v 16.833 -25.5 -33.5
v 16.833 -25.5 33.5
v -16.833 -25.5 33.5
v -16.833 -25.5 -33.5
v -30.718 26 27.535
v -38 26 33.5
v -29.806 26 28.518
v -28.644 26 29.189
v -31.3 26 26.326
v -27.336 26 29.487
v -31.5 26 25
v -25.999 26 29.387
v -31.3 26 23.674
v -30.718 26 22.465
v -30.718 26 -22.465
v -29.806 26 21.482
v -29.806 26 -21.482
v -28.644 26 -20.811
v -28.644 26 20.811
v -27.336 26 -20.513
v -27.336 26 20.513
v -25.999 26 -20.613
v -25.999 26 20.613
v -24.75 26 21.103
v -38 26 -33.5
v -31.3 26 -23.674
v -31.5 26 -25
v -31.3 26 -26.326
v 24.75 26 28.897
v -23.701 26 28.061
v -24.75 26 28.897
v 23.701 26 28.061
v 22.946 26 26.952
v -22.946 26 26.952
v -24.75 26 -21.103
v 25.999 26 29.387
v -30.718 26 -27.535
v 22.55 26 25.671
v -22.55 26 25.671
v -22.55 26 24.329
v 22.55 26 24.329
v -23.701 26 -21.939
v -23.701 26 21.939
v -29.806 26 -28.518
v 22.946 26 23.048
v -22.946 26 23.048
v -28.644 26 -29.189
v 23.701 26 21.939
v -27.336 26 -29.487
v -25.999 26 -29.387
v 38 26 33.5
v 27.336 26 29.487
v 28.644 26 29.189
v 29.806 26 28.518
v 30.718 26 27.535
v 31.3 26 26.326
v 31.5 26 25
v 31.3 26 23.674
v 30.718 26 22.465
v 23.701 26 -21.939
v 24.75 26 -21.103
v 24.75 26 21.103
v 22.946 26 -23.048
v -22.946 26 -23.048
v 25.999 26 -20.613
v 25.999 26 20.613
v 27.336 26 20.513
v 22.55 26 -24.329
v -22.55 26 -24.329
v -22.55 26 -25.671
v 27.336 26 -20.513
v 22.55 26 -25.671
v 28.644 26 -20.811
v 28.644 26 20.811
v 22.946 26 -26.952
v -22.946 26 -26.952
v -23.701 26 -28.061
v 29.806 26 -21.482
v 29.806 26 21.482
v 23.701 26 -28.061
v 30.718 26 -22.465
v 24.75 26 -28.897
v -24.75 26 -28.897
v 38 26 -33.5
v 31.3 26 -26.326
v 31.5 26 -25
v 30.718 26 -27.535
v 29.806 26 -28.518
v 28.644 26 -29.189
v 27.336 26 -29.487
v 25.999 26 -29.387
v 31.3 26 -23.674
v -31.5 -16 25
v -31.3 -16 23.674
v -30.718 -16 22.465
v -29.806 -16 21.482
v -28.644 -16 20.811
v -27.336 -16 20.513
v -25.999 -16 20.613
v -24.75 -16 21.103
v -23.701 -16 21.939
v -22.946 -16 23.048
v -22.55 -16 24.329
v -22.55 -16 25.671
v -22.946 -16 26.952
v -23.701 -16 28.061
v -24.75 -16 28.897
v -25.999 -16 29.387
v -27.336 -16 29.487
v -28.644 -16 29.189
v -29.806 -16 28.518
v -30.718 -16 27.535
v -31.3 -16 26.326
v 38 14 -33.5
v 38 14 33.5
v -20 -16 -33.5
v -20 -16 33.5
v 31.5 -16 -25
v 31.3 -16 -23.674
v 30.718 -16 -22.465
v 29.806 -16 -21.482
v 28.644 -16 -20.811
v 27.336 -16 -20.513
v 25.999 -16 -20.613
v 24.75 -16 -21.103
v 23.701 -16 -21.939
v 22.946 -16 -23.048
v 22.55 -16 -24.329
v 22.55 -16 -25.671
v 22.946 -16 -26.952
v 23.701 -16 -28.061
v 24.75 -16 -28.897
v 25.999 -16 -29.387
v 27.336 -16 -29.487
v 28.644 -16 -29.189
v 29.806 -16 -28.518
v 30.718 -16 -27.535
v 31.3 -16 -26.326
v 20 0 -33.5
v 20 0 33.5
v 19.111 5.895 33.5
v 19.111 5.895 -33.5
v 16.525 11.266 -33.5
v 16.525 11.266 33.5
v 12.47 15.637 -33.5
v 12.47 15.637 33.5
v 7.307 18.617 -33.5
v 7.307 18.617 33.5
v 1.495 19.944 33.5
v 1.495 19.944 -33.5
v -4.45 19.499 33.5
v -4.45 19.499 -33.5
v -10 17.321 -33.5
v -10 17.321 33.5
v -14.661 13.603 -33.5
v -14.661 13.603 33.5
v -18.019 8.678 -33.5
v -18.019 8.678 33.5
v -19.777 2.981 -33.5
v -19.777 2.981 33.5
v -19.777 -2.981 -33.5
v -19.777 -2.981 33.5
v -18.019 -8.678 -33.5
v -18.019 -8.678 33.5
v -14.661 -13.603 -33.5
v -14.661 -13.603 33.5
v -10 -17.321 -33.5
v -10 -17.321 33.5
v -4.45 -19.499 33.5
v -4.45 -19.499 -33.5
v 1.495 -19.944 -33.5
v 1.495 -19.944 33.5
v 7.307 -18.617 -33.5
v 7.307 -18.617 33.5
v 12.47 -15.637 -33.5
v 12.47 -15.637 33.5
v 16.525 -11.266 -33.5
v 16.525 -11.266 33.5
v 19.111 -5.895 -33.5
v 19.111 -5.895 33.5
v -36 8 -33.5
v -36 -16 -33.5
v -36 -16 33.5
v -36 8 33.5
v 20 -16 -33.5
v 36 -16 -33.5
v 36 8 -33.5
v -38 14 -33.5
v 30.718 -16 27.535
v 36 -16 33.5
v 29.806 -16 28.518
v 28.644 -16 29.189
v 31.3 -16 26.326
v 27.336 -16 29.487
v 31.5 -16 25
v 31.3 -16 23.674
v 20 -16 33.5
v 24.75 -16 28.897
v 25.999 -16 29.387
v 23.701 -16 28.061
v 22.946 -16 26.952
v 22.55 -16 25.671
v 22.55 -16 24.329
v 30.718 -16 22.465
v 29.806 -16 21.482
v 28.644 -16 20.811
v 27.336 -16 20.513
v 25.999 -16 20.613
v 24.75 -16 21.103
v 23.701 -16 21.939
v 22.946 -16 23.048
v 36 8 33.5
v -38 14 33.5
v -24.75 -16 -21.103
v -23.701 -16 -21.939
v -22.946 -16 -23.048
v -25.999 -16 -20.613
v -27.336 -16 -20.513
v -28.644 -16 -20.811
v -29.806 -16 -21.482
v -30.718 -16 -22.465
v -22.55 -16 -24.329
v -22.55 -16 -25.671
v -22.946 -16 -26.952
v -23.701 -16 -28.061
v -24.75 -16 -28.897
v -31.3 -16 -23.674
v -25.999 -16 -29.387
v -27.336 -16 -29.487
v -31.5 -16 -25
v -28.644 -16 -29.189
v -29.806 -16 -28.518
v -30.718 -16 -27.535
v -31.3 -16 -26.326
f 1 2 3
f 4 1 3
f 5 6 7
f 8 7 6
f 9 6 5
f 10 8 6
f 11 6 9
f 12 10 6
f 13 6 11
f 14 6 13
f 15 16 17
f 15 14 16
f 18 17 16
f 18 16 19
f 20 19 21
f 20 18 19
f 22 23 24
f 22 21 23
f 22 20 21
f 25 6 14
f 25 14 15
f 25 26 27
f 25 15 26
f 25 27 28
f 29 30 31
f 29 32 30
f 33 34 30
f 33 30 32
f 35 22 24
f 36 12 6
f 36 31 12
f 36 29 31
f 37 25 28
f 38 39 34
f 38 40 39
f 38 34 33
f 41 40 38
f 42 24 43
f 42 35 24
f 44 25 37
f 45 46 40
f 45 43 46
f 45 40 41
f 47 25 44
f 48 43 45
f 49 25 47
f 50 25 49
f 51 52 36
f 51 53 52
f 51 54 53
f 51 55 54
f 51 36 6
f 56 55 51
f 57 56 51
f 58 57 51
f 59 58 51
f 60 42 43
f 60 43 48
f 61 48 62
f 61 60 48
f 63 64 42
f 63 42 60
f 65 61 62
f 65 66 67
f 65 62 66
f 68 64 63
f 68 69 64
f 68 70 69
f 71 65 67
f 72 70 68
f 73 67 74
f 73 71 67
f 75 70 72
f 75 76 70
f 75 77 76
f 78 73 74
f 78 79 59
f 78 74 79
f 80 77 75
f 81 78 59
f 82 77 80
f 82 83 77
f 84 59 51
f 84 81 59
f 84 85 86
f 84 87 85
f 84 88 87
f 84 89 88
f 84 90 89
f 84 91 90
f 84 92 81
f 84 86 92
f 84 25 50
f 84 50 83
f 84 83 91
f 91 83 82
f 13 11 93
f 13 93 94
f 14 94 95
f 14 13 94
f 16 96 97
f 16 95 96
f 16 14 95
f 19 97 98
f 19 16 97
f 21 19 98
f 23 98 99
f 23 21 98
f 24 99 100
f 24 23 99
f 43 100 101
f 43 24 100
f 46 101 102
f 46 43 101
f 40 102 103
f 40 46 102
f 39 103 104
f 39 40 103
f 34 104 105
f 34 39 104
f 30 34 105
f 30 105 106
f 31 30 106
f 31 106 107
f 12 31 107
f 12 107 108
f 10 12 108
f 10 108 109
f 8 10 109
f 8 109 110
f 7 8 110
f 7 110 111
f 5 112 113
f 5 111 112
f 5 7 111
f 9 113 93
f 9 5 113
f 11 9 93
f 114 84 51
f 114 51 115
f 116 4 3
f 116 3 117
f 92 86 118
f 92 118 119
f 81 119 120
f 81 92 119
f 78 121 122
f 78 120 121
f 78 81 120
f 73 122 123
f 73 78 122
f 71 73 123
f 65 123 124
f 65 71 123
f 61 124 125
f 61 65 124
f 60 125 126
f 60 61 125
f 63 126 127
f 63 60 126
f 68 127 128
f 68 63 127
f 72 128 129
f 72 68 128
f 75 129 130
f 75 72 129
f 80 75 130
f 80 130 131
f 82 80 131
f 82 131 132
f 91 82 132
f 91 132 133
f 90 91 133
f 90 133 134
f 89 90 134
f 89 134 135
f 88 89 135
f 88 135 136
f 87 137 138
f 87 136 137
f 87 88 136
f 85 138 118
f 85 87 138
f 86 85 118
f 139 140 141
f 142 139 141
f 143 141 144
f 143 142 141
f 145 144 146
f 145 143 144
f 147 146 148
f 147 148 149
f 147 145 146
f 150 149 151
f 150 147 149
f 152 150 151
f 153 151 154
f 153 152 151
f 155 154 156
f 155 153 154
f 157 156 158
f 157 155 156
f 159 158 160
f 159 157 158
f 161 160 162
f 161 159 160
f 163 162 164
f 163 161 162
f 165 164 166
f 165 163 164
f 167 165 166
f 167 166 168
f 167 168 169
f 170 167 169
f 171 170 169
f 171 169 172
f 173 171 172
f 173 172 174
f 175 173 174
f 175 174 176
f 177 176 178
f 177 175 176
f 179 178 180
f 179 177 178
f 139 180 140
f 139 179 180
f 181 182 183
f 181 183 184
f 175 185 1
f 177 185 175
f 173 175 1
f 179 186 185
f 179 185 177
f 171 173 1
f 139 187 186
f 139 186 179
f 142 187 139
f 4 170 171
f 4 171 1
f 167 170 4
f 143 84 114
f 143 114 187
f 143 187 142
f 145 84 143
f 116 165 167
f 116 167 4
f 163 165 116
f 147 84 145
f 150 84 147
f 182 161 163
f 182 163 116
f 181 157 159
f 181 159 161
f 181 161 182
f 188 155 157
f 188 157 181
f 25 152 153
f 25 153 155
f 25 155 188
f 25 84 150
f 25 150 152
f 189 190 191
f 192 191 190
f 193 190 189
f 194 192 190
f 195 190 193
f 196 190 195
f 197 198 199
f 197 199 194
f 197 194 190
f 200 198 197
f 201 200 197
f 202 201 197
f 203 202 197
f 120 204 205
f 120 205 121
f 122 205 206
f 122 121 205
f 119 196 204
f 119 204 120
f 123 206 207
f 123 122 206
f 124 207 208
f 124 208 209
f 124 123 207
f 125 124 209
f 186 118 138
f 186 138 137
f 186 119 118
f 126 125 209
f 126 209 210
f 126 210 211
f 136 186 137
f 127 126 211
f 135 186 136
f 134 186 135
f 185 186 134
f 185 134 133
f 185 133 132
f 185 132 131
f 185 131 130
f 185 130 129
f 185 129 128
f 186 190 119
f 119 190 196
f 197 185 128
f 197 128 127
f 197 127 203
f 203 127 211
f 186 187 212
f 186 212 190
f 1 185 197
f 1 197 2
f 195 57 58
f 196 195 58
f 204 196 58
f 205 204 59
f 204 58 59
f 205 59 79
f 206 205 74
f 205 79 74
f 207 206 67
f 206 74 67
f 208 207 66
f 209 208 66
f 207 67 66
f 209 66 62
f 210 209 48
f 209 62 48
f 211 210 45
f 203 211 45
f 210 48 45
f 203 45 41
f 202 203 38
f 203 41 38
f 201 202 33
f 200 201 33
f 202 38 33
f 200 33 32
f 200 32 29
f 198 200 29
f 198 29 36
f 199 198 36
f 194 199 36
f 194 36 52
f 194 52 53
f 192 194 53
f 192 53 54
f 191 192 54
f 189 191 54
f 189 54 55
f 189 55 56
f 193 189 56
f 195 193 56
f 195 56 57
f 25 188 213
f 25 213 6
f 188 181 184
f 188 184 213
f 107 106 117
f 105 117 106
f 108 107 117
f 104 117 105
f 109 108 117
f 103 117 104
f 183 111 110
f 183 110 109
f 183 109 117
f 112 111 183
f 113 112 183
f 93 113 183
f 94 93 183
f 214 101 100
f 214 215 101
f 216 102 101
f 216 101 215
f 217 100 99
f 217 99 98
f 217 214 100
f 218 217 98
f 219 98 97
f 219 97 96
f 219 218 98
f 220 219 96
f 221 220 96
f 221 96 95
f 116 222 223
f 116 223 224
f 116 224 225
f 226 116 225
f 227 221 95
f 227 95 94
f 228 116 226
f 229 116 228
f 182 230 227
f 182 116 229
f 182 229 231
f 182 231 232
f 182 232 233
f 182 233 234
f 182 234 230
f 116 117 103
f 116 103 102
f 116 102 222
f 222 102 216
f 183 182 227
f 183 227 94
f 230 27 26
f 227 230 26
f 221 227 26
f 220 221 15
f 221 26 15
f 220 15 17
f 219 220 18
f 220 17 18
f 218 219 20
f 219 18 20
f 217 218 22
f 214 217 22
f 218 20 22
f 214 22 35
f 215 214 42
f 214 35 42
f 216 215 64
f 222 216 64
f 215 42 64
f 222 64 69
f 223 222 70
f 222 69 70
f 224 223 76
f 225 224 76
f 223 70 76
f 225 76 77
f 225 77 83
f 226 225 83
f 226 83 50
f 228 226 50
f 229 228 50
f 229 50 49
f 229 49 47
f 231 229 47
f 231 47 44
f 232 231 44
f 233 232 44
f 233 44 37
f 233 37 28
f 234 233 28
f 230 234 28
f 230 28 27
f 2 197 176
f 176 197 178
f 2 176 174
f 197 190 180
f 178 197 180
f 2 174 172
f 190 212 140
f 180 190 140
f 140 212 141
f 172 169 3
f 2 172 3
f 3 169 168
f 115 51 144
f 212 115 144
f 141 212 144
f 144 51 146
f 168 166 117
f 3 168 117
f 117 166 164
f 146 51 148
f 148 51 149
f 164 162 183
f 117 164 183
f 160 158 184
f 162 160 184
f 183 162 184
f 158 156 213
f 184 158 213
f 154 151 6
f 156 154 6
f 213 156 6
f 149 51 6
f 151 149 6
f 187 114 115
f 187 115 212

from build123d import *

# Parameters (mm, degrees)
DODANIE_WYCI_GNI_CIE1_DEPTH      = 33.5
DODANIE_WYCI_GNI_CIE1_DEPTH_BACK = 33.5
SZKIC1_R                         = 20
OTW_R_POD_RUB_M81_D              = 9
LUSTRO2_COPY_1_D                 = 9


with BuildPart() as part:
    # Szkic1 → Dodanie-wyciągnięcie1 (new, two sides: drawn at the far end of the back side and taken through both)
    with BuildSketch(Plane.XY.offset(-DODANIE_WYCI_GNI_CIE1_DEPTH_BACK)):
        Polygon((16.833333333, -25.5), (-16.833333333, -25.5), (-20, -16), (-36, -16), (-36, 8), (-38, 14), (-38, 26), (38, 26), (38, 14), (36, 8), (36, -16), (20, -16), align=None)
        Circle(SZKIC1_R, mode=Mode.SUBTRACT)
    extrude(amount=DODANIE_WYCI_GNI_CIE1_DEPTH + DODANIE_WYCI_GNI_CIE1_DEPTH_BACK)

    # Otwór pod śrubę M81 (through all)
    with Locations(Plane(origin=(0, -16, 0), x_dir=(-1, 0, 0), z_dir=(0, -1, 0))):
        with Locations((-27, -25)):
            otw_r_pod_rub_m81 = Hole(OTW_R_POD_RUB_M81_D / 2)

    # Lustro1: Otwór pod śrubę M81 across plane
    add(otw_r_pod_rub_m81.mirror(Plane(origin=(0, 0, 0), x_dir=(0, 0, 1), z_dir=(1, 0, 0))), mode=Mode.SUBTRACT)

    # Lustro2: Otwór pod śrubę M81 across plane
    add(otw_r_pod_rub_m81.mirror(Plane.XY), mode=Mode.SUBTRACT)

    # Lustro2 copy 1 (through all)
    with Locations(Plane.XZ.offset(16)):
        with Locations((-27, -25)):
            Hole(LUSTRO2_COPY_1_D / 2)


solid = part.part
